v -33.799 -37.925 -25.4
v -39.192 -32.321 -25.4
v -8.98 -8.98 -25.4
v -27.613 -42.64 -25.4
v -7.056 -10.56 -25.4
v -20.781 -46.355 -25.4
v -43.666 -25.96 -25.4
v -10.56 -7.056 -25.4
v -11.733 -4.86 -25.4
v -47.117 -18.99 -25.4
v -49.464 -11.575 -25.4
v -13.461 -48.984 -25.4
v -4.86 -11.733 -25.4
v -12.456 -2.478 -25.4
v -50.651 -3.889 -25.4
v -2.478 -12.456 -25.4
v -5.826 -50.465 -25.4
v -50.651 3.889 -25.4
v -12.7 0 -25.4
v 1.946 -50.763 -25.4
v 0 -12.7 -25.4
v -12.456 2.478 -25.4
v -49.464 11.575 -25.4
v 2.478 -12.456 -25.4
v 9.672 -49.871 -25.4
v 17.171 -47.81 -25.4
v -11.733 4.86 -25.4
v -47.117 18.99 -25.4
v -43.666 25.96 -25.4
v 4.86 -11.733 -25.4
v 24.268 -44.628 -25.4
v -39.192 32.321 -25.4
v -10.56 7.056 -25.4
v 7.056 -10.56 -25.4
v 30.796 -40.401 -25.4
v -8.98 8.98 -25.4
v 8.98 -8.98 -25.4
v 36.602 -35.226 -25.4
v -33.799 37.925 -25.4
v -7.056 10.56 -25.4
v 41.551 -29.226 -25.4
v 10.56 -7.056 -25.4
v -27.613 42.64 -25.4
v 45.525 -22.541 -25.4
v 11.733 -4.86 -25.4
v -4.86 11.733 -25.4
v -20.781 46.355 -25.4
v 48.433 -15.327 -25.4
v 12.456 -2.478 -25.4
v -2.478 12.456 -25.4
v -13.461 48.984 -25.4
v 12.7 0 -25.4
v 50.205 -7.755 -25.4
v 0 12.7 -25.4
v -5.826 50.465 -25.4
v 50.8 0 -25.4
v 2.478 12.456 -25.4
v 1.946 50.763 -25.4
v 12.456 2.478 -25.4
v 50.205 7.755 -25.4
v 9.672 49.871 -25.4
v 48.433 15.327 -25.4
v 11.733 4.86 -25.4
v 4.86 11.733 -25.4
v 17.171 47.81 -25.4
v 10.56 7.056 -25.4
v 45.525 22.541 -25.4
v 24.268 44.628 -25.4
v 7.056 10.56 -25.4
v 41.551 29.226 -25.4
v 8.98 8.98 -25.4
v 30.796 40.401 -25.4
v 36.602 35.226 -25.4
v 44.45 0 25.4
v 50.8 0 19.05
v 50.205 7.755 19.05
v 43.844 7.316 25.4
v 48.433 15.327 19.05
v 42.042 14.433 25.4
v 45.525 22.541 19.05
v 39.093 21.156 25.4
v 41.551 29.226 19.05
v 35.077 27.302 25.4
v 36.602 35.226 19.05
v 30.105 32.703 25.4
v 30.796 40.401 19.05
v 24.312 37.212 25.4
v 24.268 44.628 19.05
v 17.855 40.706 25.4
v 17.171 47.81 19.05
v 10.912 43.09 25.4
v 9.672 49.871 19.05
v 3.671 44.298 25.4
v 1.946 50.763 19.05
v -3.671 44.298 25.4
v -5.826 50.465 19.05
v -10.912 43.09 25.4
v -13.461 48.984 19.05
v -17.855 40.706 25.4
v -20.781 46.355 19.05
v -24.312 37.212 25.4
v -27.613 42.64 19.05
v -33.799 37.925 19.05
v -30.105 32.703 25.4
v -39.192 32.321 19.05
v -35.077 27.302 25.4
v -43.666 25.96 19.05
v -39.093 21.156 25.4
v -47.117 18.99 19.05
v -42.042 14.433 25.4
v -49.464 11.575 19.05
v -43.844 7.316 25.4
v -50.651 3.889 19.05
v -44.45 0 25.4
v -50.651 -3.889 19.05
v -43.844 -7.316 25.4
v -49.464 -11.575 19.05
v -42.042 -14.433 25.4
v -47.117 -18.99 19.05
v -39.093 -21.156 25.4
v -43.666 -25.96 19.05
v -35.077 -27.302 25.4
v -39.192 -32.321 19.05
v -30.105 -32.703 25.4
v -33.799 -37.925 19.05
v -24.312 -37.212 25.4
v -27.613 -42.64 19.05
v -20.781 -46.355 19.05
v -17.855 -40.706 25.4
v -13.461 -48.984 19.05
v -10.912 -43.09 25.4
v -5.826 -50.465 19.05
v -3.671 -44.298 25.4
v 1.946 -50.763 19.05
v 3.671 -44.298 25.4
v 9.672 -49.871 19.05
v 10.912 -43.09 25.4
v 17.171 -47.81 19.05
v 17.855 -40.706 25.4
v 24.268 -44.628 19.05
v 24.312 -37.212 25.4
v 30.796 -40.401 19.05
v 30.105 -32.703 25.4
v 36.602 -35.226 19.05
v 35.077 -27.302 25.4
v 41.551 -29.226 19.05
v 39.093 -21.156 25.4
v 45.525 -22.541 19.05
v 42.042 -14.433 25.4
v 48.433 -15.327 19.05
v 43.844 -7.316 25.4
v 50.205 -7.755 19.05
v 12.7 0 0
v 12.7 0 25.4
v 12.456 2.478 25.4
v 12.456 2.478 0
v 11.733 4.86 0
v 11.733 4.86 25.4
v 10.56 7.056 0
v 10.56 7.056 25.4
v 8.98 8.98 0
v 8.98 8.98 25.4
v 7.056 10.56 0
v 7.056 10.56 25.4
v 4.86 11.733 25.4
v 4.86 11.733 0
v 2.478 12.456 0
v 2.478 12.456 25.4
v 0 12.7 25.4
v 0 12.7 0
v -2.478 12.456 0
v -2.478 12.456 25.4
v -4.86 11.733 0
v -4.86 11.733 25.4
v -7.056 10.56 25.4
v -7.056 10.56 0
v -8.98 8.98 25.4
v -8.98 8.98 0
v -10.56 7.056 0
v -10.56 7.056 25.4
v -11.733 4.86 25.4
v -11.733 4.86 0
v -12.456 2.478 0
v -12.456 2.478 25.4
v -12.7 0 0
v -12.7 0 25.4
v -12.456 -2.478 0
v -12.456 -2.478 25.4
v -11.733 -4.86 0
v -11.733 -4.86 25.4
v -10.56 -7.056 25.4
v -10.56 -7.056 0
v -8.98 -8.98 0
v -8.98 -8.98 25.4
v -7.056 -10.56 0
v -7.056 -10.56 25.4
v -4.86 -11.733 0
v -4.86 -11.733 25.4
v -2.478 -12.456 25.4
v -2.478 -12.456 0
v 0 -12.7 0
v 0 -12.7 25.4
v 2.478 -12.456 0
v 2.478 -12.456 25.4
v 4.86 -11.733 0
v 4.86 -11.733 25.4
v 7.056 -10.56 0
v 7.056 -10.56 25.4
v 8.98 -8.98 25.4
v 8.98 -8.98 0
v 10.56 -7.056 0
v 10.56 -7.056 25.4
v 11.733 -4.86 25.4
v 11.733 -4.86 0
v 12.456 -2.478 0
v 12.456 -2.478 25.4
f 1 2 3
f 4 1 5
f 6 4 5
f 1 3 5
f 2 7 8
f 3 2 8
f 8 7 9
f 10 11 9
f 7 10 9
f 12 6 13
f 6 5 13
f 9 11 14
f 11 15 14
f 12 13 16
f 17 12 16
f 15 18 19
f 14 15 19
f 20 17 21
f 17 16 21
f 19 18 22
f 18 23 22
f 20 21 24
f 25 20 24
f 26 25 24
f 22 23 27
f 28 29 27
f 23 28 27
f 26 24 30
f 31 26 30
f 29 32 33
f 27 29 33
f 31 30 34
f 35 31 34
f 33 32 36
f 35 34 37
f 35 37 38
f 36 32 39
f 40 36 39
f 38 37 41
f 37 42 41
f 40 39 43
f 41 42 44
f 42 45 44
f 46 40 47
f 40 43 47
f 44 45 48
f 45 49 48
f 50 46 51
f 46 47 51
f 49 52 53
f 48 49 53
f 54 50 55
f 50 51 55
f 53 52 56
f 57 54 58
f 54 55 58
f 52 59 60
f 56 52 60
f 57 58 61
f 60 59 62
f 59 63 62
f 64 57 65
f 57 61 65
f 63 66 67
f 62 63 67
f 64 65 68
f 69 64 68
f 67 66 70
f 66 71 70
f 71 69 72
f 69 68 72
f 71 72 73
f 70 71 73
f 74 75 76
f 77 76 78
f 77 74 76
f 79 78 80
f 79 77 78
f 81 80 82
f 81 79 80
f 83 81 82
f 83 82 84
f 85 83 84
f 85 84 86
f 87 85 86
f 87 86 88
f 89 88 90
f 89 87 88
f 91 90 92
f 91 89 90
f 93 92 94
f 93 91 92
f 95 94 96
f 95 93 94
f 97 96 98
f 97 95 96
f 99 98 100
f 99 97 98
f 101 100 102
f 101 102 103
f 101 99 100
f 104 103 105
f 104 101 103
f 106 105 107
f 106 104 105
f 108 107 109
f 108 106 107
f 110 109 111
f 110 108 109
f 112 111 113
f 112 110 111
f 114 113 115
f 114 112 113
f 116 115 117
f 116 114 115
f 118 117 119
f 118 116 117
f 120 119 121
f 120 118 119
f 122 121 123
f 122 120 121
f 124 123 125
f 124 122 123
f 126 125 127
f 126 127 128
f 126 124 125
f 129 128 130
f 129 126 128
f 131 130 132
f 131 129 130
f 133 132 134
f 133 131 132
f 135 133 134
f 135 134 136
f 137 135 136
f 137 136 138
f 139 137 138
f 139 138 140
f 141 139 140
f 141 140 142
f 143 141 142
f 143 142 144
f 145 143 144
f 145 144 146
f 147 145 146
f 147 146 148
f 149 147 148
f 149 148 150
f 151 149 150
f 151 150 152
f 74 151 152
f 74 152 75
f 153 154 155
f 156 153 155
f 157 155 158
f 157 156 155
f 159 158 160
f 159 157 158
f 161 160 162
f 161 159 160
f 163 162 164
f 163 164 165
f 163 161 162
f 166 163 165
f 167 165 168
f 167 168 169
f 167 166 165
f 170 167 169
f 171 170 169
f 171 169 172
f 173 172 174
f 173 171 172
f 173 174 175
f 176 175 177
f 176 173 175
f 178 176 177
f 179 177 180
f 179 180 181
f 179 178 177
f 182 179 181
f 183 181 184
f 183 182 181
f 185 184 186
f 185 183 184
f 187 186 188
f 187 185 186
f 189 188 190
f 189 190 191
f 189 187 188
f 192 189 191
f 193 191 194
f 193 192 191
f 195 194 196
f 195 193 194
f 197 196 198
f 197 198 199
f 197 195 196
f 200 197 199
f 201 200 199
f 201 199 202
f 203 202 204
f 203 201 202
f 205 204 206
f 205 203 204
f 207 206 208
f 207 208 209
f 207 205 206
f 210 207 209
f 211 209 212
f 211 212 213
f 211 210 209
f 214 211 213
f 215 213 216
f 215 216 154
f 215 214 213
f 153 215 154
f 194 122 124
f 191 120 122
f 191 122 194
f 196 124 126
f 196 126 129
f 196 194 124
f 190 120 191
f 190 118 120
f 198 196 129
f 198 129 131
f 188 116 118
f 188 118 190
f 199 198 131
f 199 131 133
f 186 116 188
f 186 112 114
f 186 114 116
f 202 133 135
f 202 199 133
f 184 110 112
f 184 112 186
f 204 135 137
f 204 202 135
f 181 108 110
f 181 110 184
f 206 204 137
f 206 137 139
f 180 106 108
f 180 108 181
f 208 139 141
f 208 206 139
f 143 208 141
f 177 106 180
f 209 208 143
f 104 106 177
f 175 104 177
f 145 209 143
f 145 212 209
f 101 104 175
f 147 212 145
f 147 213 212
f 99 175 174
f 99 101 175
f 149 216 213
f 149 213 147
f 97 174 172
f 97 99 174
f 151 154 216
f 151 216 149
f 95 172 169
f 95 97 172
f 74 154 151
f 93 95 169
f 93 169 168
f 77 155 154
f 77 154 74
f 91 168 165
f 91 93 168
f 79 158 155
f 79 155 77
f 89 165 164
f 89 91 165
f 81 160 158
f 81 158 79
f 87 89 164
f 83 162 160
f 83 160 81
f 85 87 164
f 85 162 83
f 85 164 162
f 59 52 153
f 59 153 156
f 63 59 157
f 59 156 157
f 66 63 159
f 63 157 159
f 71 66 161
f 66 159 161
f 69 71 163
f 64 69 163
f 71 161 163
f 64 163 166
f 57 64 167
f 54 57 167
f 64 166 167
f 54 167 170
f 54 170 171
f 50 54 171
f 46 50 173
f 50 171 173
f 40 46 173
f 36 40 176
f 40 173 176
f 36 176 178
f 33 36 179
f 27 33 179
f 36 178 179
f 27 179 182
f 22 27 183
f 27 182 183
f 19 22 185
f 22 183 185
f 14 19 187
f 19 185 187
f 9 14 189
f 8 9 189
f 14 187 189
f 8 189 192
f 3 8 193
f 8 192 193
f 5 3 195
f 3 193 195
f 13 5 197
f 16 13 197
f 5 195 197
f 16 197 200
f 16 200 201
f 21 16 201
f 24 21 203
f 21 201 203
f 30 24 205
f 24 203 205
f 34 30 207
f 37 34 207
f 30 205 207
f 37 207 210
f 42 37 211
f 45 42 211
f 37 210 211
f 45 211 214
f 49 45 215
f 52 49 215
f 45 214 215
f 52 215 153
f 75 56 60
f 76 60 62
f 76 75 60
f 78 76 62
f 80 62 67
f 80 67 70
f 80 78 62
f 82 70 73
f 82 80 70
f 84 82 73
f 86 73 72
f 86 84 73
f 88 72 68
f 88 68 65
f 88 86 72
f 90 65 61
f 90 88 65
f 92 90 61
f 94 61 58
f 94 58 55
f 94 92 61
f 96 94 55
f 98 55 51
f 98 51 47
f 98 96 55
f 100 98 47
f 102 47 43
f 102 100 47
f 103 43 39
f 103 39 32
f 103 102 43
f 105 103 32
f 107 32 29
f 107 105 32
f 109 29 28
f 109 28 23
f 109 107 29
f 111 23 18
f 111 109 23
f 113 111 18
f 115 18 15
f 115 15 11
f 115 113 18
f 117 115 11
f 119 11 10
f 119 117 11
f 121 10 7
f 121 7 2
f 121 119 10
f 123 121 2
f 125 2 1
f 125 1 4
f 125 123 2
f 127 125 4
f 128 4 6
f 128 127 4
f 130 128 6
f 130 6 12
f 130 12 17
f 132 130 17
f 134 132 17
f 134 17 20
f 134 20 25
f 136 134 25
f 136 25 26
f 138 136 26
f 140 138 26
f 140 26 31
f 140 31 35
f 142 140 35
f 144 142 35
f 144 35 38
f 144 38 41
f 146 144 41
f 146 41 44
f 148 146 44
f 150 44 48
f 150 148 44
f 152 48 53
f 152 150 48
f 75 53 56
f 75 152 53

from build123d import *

# Parameters (mm, degrees)
F0_R     = 50.8
F0_R_2   = 12.7
F1_DEPTH = 25.4
F2_SIZE  = 6.35
F3_DEPTH = 25.4


with BuildPart() as f1:
    # F0 (on Top) → F1 (new body)
    with BuildSketch(Plane.XY):
        Circle(F0_R)
        Circle(F0_R_2, mode=Mode.SUBTRACT)
    extrude(amount=F1_DEPTH)

    # F2
    f2_edges = [f1.edges().sort_by_distance(p)[0] for p in [
        (-50.8, 0, 25.4),
    ]]
    chamfer(f2_edges, length=F2_SIZE)

    # F0 (on Top) → F3 (join)
    with BuildSketch(Plane.XY):
        Circle(F0_R)
        Circle(F0_R_2, mode=Mode.SUBTRACT)
    extrude(amount=-F3_DEPTH)


solid = f1.part
